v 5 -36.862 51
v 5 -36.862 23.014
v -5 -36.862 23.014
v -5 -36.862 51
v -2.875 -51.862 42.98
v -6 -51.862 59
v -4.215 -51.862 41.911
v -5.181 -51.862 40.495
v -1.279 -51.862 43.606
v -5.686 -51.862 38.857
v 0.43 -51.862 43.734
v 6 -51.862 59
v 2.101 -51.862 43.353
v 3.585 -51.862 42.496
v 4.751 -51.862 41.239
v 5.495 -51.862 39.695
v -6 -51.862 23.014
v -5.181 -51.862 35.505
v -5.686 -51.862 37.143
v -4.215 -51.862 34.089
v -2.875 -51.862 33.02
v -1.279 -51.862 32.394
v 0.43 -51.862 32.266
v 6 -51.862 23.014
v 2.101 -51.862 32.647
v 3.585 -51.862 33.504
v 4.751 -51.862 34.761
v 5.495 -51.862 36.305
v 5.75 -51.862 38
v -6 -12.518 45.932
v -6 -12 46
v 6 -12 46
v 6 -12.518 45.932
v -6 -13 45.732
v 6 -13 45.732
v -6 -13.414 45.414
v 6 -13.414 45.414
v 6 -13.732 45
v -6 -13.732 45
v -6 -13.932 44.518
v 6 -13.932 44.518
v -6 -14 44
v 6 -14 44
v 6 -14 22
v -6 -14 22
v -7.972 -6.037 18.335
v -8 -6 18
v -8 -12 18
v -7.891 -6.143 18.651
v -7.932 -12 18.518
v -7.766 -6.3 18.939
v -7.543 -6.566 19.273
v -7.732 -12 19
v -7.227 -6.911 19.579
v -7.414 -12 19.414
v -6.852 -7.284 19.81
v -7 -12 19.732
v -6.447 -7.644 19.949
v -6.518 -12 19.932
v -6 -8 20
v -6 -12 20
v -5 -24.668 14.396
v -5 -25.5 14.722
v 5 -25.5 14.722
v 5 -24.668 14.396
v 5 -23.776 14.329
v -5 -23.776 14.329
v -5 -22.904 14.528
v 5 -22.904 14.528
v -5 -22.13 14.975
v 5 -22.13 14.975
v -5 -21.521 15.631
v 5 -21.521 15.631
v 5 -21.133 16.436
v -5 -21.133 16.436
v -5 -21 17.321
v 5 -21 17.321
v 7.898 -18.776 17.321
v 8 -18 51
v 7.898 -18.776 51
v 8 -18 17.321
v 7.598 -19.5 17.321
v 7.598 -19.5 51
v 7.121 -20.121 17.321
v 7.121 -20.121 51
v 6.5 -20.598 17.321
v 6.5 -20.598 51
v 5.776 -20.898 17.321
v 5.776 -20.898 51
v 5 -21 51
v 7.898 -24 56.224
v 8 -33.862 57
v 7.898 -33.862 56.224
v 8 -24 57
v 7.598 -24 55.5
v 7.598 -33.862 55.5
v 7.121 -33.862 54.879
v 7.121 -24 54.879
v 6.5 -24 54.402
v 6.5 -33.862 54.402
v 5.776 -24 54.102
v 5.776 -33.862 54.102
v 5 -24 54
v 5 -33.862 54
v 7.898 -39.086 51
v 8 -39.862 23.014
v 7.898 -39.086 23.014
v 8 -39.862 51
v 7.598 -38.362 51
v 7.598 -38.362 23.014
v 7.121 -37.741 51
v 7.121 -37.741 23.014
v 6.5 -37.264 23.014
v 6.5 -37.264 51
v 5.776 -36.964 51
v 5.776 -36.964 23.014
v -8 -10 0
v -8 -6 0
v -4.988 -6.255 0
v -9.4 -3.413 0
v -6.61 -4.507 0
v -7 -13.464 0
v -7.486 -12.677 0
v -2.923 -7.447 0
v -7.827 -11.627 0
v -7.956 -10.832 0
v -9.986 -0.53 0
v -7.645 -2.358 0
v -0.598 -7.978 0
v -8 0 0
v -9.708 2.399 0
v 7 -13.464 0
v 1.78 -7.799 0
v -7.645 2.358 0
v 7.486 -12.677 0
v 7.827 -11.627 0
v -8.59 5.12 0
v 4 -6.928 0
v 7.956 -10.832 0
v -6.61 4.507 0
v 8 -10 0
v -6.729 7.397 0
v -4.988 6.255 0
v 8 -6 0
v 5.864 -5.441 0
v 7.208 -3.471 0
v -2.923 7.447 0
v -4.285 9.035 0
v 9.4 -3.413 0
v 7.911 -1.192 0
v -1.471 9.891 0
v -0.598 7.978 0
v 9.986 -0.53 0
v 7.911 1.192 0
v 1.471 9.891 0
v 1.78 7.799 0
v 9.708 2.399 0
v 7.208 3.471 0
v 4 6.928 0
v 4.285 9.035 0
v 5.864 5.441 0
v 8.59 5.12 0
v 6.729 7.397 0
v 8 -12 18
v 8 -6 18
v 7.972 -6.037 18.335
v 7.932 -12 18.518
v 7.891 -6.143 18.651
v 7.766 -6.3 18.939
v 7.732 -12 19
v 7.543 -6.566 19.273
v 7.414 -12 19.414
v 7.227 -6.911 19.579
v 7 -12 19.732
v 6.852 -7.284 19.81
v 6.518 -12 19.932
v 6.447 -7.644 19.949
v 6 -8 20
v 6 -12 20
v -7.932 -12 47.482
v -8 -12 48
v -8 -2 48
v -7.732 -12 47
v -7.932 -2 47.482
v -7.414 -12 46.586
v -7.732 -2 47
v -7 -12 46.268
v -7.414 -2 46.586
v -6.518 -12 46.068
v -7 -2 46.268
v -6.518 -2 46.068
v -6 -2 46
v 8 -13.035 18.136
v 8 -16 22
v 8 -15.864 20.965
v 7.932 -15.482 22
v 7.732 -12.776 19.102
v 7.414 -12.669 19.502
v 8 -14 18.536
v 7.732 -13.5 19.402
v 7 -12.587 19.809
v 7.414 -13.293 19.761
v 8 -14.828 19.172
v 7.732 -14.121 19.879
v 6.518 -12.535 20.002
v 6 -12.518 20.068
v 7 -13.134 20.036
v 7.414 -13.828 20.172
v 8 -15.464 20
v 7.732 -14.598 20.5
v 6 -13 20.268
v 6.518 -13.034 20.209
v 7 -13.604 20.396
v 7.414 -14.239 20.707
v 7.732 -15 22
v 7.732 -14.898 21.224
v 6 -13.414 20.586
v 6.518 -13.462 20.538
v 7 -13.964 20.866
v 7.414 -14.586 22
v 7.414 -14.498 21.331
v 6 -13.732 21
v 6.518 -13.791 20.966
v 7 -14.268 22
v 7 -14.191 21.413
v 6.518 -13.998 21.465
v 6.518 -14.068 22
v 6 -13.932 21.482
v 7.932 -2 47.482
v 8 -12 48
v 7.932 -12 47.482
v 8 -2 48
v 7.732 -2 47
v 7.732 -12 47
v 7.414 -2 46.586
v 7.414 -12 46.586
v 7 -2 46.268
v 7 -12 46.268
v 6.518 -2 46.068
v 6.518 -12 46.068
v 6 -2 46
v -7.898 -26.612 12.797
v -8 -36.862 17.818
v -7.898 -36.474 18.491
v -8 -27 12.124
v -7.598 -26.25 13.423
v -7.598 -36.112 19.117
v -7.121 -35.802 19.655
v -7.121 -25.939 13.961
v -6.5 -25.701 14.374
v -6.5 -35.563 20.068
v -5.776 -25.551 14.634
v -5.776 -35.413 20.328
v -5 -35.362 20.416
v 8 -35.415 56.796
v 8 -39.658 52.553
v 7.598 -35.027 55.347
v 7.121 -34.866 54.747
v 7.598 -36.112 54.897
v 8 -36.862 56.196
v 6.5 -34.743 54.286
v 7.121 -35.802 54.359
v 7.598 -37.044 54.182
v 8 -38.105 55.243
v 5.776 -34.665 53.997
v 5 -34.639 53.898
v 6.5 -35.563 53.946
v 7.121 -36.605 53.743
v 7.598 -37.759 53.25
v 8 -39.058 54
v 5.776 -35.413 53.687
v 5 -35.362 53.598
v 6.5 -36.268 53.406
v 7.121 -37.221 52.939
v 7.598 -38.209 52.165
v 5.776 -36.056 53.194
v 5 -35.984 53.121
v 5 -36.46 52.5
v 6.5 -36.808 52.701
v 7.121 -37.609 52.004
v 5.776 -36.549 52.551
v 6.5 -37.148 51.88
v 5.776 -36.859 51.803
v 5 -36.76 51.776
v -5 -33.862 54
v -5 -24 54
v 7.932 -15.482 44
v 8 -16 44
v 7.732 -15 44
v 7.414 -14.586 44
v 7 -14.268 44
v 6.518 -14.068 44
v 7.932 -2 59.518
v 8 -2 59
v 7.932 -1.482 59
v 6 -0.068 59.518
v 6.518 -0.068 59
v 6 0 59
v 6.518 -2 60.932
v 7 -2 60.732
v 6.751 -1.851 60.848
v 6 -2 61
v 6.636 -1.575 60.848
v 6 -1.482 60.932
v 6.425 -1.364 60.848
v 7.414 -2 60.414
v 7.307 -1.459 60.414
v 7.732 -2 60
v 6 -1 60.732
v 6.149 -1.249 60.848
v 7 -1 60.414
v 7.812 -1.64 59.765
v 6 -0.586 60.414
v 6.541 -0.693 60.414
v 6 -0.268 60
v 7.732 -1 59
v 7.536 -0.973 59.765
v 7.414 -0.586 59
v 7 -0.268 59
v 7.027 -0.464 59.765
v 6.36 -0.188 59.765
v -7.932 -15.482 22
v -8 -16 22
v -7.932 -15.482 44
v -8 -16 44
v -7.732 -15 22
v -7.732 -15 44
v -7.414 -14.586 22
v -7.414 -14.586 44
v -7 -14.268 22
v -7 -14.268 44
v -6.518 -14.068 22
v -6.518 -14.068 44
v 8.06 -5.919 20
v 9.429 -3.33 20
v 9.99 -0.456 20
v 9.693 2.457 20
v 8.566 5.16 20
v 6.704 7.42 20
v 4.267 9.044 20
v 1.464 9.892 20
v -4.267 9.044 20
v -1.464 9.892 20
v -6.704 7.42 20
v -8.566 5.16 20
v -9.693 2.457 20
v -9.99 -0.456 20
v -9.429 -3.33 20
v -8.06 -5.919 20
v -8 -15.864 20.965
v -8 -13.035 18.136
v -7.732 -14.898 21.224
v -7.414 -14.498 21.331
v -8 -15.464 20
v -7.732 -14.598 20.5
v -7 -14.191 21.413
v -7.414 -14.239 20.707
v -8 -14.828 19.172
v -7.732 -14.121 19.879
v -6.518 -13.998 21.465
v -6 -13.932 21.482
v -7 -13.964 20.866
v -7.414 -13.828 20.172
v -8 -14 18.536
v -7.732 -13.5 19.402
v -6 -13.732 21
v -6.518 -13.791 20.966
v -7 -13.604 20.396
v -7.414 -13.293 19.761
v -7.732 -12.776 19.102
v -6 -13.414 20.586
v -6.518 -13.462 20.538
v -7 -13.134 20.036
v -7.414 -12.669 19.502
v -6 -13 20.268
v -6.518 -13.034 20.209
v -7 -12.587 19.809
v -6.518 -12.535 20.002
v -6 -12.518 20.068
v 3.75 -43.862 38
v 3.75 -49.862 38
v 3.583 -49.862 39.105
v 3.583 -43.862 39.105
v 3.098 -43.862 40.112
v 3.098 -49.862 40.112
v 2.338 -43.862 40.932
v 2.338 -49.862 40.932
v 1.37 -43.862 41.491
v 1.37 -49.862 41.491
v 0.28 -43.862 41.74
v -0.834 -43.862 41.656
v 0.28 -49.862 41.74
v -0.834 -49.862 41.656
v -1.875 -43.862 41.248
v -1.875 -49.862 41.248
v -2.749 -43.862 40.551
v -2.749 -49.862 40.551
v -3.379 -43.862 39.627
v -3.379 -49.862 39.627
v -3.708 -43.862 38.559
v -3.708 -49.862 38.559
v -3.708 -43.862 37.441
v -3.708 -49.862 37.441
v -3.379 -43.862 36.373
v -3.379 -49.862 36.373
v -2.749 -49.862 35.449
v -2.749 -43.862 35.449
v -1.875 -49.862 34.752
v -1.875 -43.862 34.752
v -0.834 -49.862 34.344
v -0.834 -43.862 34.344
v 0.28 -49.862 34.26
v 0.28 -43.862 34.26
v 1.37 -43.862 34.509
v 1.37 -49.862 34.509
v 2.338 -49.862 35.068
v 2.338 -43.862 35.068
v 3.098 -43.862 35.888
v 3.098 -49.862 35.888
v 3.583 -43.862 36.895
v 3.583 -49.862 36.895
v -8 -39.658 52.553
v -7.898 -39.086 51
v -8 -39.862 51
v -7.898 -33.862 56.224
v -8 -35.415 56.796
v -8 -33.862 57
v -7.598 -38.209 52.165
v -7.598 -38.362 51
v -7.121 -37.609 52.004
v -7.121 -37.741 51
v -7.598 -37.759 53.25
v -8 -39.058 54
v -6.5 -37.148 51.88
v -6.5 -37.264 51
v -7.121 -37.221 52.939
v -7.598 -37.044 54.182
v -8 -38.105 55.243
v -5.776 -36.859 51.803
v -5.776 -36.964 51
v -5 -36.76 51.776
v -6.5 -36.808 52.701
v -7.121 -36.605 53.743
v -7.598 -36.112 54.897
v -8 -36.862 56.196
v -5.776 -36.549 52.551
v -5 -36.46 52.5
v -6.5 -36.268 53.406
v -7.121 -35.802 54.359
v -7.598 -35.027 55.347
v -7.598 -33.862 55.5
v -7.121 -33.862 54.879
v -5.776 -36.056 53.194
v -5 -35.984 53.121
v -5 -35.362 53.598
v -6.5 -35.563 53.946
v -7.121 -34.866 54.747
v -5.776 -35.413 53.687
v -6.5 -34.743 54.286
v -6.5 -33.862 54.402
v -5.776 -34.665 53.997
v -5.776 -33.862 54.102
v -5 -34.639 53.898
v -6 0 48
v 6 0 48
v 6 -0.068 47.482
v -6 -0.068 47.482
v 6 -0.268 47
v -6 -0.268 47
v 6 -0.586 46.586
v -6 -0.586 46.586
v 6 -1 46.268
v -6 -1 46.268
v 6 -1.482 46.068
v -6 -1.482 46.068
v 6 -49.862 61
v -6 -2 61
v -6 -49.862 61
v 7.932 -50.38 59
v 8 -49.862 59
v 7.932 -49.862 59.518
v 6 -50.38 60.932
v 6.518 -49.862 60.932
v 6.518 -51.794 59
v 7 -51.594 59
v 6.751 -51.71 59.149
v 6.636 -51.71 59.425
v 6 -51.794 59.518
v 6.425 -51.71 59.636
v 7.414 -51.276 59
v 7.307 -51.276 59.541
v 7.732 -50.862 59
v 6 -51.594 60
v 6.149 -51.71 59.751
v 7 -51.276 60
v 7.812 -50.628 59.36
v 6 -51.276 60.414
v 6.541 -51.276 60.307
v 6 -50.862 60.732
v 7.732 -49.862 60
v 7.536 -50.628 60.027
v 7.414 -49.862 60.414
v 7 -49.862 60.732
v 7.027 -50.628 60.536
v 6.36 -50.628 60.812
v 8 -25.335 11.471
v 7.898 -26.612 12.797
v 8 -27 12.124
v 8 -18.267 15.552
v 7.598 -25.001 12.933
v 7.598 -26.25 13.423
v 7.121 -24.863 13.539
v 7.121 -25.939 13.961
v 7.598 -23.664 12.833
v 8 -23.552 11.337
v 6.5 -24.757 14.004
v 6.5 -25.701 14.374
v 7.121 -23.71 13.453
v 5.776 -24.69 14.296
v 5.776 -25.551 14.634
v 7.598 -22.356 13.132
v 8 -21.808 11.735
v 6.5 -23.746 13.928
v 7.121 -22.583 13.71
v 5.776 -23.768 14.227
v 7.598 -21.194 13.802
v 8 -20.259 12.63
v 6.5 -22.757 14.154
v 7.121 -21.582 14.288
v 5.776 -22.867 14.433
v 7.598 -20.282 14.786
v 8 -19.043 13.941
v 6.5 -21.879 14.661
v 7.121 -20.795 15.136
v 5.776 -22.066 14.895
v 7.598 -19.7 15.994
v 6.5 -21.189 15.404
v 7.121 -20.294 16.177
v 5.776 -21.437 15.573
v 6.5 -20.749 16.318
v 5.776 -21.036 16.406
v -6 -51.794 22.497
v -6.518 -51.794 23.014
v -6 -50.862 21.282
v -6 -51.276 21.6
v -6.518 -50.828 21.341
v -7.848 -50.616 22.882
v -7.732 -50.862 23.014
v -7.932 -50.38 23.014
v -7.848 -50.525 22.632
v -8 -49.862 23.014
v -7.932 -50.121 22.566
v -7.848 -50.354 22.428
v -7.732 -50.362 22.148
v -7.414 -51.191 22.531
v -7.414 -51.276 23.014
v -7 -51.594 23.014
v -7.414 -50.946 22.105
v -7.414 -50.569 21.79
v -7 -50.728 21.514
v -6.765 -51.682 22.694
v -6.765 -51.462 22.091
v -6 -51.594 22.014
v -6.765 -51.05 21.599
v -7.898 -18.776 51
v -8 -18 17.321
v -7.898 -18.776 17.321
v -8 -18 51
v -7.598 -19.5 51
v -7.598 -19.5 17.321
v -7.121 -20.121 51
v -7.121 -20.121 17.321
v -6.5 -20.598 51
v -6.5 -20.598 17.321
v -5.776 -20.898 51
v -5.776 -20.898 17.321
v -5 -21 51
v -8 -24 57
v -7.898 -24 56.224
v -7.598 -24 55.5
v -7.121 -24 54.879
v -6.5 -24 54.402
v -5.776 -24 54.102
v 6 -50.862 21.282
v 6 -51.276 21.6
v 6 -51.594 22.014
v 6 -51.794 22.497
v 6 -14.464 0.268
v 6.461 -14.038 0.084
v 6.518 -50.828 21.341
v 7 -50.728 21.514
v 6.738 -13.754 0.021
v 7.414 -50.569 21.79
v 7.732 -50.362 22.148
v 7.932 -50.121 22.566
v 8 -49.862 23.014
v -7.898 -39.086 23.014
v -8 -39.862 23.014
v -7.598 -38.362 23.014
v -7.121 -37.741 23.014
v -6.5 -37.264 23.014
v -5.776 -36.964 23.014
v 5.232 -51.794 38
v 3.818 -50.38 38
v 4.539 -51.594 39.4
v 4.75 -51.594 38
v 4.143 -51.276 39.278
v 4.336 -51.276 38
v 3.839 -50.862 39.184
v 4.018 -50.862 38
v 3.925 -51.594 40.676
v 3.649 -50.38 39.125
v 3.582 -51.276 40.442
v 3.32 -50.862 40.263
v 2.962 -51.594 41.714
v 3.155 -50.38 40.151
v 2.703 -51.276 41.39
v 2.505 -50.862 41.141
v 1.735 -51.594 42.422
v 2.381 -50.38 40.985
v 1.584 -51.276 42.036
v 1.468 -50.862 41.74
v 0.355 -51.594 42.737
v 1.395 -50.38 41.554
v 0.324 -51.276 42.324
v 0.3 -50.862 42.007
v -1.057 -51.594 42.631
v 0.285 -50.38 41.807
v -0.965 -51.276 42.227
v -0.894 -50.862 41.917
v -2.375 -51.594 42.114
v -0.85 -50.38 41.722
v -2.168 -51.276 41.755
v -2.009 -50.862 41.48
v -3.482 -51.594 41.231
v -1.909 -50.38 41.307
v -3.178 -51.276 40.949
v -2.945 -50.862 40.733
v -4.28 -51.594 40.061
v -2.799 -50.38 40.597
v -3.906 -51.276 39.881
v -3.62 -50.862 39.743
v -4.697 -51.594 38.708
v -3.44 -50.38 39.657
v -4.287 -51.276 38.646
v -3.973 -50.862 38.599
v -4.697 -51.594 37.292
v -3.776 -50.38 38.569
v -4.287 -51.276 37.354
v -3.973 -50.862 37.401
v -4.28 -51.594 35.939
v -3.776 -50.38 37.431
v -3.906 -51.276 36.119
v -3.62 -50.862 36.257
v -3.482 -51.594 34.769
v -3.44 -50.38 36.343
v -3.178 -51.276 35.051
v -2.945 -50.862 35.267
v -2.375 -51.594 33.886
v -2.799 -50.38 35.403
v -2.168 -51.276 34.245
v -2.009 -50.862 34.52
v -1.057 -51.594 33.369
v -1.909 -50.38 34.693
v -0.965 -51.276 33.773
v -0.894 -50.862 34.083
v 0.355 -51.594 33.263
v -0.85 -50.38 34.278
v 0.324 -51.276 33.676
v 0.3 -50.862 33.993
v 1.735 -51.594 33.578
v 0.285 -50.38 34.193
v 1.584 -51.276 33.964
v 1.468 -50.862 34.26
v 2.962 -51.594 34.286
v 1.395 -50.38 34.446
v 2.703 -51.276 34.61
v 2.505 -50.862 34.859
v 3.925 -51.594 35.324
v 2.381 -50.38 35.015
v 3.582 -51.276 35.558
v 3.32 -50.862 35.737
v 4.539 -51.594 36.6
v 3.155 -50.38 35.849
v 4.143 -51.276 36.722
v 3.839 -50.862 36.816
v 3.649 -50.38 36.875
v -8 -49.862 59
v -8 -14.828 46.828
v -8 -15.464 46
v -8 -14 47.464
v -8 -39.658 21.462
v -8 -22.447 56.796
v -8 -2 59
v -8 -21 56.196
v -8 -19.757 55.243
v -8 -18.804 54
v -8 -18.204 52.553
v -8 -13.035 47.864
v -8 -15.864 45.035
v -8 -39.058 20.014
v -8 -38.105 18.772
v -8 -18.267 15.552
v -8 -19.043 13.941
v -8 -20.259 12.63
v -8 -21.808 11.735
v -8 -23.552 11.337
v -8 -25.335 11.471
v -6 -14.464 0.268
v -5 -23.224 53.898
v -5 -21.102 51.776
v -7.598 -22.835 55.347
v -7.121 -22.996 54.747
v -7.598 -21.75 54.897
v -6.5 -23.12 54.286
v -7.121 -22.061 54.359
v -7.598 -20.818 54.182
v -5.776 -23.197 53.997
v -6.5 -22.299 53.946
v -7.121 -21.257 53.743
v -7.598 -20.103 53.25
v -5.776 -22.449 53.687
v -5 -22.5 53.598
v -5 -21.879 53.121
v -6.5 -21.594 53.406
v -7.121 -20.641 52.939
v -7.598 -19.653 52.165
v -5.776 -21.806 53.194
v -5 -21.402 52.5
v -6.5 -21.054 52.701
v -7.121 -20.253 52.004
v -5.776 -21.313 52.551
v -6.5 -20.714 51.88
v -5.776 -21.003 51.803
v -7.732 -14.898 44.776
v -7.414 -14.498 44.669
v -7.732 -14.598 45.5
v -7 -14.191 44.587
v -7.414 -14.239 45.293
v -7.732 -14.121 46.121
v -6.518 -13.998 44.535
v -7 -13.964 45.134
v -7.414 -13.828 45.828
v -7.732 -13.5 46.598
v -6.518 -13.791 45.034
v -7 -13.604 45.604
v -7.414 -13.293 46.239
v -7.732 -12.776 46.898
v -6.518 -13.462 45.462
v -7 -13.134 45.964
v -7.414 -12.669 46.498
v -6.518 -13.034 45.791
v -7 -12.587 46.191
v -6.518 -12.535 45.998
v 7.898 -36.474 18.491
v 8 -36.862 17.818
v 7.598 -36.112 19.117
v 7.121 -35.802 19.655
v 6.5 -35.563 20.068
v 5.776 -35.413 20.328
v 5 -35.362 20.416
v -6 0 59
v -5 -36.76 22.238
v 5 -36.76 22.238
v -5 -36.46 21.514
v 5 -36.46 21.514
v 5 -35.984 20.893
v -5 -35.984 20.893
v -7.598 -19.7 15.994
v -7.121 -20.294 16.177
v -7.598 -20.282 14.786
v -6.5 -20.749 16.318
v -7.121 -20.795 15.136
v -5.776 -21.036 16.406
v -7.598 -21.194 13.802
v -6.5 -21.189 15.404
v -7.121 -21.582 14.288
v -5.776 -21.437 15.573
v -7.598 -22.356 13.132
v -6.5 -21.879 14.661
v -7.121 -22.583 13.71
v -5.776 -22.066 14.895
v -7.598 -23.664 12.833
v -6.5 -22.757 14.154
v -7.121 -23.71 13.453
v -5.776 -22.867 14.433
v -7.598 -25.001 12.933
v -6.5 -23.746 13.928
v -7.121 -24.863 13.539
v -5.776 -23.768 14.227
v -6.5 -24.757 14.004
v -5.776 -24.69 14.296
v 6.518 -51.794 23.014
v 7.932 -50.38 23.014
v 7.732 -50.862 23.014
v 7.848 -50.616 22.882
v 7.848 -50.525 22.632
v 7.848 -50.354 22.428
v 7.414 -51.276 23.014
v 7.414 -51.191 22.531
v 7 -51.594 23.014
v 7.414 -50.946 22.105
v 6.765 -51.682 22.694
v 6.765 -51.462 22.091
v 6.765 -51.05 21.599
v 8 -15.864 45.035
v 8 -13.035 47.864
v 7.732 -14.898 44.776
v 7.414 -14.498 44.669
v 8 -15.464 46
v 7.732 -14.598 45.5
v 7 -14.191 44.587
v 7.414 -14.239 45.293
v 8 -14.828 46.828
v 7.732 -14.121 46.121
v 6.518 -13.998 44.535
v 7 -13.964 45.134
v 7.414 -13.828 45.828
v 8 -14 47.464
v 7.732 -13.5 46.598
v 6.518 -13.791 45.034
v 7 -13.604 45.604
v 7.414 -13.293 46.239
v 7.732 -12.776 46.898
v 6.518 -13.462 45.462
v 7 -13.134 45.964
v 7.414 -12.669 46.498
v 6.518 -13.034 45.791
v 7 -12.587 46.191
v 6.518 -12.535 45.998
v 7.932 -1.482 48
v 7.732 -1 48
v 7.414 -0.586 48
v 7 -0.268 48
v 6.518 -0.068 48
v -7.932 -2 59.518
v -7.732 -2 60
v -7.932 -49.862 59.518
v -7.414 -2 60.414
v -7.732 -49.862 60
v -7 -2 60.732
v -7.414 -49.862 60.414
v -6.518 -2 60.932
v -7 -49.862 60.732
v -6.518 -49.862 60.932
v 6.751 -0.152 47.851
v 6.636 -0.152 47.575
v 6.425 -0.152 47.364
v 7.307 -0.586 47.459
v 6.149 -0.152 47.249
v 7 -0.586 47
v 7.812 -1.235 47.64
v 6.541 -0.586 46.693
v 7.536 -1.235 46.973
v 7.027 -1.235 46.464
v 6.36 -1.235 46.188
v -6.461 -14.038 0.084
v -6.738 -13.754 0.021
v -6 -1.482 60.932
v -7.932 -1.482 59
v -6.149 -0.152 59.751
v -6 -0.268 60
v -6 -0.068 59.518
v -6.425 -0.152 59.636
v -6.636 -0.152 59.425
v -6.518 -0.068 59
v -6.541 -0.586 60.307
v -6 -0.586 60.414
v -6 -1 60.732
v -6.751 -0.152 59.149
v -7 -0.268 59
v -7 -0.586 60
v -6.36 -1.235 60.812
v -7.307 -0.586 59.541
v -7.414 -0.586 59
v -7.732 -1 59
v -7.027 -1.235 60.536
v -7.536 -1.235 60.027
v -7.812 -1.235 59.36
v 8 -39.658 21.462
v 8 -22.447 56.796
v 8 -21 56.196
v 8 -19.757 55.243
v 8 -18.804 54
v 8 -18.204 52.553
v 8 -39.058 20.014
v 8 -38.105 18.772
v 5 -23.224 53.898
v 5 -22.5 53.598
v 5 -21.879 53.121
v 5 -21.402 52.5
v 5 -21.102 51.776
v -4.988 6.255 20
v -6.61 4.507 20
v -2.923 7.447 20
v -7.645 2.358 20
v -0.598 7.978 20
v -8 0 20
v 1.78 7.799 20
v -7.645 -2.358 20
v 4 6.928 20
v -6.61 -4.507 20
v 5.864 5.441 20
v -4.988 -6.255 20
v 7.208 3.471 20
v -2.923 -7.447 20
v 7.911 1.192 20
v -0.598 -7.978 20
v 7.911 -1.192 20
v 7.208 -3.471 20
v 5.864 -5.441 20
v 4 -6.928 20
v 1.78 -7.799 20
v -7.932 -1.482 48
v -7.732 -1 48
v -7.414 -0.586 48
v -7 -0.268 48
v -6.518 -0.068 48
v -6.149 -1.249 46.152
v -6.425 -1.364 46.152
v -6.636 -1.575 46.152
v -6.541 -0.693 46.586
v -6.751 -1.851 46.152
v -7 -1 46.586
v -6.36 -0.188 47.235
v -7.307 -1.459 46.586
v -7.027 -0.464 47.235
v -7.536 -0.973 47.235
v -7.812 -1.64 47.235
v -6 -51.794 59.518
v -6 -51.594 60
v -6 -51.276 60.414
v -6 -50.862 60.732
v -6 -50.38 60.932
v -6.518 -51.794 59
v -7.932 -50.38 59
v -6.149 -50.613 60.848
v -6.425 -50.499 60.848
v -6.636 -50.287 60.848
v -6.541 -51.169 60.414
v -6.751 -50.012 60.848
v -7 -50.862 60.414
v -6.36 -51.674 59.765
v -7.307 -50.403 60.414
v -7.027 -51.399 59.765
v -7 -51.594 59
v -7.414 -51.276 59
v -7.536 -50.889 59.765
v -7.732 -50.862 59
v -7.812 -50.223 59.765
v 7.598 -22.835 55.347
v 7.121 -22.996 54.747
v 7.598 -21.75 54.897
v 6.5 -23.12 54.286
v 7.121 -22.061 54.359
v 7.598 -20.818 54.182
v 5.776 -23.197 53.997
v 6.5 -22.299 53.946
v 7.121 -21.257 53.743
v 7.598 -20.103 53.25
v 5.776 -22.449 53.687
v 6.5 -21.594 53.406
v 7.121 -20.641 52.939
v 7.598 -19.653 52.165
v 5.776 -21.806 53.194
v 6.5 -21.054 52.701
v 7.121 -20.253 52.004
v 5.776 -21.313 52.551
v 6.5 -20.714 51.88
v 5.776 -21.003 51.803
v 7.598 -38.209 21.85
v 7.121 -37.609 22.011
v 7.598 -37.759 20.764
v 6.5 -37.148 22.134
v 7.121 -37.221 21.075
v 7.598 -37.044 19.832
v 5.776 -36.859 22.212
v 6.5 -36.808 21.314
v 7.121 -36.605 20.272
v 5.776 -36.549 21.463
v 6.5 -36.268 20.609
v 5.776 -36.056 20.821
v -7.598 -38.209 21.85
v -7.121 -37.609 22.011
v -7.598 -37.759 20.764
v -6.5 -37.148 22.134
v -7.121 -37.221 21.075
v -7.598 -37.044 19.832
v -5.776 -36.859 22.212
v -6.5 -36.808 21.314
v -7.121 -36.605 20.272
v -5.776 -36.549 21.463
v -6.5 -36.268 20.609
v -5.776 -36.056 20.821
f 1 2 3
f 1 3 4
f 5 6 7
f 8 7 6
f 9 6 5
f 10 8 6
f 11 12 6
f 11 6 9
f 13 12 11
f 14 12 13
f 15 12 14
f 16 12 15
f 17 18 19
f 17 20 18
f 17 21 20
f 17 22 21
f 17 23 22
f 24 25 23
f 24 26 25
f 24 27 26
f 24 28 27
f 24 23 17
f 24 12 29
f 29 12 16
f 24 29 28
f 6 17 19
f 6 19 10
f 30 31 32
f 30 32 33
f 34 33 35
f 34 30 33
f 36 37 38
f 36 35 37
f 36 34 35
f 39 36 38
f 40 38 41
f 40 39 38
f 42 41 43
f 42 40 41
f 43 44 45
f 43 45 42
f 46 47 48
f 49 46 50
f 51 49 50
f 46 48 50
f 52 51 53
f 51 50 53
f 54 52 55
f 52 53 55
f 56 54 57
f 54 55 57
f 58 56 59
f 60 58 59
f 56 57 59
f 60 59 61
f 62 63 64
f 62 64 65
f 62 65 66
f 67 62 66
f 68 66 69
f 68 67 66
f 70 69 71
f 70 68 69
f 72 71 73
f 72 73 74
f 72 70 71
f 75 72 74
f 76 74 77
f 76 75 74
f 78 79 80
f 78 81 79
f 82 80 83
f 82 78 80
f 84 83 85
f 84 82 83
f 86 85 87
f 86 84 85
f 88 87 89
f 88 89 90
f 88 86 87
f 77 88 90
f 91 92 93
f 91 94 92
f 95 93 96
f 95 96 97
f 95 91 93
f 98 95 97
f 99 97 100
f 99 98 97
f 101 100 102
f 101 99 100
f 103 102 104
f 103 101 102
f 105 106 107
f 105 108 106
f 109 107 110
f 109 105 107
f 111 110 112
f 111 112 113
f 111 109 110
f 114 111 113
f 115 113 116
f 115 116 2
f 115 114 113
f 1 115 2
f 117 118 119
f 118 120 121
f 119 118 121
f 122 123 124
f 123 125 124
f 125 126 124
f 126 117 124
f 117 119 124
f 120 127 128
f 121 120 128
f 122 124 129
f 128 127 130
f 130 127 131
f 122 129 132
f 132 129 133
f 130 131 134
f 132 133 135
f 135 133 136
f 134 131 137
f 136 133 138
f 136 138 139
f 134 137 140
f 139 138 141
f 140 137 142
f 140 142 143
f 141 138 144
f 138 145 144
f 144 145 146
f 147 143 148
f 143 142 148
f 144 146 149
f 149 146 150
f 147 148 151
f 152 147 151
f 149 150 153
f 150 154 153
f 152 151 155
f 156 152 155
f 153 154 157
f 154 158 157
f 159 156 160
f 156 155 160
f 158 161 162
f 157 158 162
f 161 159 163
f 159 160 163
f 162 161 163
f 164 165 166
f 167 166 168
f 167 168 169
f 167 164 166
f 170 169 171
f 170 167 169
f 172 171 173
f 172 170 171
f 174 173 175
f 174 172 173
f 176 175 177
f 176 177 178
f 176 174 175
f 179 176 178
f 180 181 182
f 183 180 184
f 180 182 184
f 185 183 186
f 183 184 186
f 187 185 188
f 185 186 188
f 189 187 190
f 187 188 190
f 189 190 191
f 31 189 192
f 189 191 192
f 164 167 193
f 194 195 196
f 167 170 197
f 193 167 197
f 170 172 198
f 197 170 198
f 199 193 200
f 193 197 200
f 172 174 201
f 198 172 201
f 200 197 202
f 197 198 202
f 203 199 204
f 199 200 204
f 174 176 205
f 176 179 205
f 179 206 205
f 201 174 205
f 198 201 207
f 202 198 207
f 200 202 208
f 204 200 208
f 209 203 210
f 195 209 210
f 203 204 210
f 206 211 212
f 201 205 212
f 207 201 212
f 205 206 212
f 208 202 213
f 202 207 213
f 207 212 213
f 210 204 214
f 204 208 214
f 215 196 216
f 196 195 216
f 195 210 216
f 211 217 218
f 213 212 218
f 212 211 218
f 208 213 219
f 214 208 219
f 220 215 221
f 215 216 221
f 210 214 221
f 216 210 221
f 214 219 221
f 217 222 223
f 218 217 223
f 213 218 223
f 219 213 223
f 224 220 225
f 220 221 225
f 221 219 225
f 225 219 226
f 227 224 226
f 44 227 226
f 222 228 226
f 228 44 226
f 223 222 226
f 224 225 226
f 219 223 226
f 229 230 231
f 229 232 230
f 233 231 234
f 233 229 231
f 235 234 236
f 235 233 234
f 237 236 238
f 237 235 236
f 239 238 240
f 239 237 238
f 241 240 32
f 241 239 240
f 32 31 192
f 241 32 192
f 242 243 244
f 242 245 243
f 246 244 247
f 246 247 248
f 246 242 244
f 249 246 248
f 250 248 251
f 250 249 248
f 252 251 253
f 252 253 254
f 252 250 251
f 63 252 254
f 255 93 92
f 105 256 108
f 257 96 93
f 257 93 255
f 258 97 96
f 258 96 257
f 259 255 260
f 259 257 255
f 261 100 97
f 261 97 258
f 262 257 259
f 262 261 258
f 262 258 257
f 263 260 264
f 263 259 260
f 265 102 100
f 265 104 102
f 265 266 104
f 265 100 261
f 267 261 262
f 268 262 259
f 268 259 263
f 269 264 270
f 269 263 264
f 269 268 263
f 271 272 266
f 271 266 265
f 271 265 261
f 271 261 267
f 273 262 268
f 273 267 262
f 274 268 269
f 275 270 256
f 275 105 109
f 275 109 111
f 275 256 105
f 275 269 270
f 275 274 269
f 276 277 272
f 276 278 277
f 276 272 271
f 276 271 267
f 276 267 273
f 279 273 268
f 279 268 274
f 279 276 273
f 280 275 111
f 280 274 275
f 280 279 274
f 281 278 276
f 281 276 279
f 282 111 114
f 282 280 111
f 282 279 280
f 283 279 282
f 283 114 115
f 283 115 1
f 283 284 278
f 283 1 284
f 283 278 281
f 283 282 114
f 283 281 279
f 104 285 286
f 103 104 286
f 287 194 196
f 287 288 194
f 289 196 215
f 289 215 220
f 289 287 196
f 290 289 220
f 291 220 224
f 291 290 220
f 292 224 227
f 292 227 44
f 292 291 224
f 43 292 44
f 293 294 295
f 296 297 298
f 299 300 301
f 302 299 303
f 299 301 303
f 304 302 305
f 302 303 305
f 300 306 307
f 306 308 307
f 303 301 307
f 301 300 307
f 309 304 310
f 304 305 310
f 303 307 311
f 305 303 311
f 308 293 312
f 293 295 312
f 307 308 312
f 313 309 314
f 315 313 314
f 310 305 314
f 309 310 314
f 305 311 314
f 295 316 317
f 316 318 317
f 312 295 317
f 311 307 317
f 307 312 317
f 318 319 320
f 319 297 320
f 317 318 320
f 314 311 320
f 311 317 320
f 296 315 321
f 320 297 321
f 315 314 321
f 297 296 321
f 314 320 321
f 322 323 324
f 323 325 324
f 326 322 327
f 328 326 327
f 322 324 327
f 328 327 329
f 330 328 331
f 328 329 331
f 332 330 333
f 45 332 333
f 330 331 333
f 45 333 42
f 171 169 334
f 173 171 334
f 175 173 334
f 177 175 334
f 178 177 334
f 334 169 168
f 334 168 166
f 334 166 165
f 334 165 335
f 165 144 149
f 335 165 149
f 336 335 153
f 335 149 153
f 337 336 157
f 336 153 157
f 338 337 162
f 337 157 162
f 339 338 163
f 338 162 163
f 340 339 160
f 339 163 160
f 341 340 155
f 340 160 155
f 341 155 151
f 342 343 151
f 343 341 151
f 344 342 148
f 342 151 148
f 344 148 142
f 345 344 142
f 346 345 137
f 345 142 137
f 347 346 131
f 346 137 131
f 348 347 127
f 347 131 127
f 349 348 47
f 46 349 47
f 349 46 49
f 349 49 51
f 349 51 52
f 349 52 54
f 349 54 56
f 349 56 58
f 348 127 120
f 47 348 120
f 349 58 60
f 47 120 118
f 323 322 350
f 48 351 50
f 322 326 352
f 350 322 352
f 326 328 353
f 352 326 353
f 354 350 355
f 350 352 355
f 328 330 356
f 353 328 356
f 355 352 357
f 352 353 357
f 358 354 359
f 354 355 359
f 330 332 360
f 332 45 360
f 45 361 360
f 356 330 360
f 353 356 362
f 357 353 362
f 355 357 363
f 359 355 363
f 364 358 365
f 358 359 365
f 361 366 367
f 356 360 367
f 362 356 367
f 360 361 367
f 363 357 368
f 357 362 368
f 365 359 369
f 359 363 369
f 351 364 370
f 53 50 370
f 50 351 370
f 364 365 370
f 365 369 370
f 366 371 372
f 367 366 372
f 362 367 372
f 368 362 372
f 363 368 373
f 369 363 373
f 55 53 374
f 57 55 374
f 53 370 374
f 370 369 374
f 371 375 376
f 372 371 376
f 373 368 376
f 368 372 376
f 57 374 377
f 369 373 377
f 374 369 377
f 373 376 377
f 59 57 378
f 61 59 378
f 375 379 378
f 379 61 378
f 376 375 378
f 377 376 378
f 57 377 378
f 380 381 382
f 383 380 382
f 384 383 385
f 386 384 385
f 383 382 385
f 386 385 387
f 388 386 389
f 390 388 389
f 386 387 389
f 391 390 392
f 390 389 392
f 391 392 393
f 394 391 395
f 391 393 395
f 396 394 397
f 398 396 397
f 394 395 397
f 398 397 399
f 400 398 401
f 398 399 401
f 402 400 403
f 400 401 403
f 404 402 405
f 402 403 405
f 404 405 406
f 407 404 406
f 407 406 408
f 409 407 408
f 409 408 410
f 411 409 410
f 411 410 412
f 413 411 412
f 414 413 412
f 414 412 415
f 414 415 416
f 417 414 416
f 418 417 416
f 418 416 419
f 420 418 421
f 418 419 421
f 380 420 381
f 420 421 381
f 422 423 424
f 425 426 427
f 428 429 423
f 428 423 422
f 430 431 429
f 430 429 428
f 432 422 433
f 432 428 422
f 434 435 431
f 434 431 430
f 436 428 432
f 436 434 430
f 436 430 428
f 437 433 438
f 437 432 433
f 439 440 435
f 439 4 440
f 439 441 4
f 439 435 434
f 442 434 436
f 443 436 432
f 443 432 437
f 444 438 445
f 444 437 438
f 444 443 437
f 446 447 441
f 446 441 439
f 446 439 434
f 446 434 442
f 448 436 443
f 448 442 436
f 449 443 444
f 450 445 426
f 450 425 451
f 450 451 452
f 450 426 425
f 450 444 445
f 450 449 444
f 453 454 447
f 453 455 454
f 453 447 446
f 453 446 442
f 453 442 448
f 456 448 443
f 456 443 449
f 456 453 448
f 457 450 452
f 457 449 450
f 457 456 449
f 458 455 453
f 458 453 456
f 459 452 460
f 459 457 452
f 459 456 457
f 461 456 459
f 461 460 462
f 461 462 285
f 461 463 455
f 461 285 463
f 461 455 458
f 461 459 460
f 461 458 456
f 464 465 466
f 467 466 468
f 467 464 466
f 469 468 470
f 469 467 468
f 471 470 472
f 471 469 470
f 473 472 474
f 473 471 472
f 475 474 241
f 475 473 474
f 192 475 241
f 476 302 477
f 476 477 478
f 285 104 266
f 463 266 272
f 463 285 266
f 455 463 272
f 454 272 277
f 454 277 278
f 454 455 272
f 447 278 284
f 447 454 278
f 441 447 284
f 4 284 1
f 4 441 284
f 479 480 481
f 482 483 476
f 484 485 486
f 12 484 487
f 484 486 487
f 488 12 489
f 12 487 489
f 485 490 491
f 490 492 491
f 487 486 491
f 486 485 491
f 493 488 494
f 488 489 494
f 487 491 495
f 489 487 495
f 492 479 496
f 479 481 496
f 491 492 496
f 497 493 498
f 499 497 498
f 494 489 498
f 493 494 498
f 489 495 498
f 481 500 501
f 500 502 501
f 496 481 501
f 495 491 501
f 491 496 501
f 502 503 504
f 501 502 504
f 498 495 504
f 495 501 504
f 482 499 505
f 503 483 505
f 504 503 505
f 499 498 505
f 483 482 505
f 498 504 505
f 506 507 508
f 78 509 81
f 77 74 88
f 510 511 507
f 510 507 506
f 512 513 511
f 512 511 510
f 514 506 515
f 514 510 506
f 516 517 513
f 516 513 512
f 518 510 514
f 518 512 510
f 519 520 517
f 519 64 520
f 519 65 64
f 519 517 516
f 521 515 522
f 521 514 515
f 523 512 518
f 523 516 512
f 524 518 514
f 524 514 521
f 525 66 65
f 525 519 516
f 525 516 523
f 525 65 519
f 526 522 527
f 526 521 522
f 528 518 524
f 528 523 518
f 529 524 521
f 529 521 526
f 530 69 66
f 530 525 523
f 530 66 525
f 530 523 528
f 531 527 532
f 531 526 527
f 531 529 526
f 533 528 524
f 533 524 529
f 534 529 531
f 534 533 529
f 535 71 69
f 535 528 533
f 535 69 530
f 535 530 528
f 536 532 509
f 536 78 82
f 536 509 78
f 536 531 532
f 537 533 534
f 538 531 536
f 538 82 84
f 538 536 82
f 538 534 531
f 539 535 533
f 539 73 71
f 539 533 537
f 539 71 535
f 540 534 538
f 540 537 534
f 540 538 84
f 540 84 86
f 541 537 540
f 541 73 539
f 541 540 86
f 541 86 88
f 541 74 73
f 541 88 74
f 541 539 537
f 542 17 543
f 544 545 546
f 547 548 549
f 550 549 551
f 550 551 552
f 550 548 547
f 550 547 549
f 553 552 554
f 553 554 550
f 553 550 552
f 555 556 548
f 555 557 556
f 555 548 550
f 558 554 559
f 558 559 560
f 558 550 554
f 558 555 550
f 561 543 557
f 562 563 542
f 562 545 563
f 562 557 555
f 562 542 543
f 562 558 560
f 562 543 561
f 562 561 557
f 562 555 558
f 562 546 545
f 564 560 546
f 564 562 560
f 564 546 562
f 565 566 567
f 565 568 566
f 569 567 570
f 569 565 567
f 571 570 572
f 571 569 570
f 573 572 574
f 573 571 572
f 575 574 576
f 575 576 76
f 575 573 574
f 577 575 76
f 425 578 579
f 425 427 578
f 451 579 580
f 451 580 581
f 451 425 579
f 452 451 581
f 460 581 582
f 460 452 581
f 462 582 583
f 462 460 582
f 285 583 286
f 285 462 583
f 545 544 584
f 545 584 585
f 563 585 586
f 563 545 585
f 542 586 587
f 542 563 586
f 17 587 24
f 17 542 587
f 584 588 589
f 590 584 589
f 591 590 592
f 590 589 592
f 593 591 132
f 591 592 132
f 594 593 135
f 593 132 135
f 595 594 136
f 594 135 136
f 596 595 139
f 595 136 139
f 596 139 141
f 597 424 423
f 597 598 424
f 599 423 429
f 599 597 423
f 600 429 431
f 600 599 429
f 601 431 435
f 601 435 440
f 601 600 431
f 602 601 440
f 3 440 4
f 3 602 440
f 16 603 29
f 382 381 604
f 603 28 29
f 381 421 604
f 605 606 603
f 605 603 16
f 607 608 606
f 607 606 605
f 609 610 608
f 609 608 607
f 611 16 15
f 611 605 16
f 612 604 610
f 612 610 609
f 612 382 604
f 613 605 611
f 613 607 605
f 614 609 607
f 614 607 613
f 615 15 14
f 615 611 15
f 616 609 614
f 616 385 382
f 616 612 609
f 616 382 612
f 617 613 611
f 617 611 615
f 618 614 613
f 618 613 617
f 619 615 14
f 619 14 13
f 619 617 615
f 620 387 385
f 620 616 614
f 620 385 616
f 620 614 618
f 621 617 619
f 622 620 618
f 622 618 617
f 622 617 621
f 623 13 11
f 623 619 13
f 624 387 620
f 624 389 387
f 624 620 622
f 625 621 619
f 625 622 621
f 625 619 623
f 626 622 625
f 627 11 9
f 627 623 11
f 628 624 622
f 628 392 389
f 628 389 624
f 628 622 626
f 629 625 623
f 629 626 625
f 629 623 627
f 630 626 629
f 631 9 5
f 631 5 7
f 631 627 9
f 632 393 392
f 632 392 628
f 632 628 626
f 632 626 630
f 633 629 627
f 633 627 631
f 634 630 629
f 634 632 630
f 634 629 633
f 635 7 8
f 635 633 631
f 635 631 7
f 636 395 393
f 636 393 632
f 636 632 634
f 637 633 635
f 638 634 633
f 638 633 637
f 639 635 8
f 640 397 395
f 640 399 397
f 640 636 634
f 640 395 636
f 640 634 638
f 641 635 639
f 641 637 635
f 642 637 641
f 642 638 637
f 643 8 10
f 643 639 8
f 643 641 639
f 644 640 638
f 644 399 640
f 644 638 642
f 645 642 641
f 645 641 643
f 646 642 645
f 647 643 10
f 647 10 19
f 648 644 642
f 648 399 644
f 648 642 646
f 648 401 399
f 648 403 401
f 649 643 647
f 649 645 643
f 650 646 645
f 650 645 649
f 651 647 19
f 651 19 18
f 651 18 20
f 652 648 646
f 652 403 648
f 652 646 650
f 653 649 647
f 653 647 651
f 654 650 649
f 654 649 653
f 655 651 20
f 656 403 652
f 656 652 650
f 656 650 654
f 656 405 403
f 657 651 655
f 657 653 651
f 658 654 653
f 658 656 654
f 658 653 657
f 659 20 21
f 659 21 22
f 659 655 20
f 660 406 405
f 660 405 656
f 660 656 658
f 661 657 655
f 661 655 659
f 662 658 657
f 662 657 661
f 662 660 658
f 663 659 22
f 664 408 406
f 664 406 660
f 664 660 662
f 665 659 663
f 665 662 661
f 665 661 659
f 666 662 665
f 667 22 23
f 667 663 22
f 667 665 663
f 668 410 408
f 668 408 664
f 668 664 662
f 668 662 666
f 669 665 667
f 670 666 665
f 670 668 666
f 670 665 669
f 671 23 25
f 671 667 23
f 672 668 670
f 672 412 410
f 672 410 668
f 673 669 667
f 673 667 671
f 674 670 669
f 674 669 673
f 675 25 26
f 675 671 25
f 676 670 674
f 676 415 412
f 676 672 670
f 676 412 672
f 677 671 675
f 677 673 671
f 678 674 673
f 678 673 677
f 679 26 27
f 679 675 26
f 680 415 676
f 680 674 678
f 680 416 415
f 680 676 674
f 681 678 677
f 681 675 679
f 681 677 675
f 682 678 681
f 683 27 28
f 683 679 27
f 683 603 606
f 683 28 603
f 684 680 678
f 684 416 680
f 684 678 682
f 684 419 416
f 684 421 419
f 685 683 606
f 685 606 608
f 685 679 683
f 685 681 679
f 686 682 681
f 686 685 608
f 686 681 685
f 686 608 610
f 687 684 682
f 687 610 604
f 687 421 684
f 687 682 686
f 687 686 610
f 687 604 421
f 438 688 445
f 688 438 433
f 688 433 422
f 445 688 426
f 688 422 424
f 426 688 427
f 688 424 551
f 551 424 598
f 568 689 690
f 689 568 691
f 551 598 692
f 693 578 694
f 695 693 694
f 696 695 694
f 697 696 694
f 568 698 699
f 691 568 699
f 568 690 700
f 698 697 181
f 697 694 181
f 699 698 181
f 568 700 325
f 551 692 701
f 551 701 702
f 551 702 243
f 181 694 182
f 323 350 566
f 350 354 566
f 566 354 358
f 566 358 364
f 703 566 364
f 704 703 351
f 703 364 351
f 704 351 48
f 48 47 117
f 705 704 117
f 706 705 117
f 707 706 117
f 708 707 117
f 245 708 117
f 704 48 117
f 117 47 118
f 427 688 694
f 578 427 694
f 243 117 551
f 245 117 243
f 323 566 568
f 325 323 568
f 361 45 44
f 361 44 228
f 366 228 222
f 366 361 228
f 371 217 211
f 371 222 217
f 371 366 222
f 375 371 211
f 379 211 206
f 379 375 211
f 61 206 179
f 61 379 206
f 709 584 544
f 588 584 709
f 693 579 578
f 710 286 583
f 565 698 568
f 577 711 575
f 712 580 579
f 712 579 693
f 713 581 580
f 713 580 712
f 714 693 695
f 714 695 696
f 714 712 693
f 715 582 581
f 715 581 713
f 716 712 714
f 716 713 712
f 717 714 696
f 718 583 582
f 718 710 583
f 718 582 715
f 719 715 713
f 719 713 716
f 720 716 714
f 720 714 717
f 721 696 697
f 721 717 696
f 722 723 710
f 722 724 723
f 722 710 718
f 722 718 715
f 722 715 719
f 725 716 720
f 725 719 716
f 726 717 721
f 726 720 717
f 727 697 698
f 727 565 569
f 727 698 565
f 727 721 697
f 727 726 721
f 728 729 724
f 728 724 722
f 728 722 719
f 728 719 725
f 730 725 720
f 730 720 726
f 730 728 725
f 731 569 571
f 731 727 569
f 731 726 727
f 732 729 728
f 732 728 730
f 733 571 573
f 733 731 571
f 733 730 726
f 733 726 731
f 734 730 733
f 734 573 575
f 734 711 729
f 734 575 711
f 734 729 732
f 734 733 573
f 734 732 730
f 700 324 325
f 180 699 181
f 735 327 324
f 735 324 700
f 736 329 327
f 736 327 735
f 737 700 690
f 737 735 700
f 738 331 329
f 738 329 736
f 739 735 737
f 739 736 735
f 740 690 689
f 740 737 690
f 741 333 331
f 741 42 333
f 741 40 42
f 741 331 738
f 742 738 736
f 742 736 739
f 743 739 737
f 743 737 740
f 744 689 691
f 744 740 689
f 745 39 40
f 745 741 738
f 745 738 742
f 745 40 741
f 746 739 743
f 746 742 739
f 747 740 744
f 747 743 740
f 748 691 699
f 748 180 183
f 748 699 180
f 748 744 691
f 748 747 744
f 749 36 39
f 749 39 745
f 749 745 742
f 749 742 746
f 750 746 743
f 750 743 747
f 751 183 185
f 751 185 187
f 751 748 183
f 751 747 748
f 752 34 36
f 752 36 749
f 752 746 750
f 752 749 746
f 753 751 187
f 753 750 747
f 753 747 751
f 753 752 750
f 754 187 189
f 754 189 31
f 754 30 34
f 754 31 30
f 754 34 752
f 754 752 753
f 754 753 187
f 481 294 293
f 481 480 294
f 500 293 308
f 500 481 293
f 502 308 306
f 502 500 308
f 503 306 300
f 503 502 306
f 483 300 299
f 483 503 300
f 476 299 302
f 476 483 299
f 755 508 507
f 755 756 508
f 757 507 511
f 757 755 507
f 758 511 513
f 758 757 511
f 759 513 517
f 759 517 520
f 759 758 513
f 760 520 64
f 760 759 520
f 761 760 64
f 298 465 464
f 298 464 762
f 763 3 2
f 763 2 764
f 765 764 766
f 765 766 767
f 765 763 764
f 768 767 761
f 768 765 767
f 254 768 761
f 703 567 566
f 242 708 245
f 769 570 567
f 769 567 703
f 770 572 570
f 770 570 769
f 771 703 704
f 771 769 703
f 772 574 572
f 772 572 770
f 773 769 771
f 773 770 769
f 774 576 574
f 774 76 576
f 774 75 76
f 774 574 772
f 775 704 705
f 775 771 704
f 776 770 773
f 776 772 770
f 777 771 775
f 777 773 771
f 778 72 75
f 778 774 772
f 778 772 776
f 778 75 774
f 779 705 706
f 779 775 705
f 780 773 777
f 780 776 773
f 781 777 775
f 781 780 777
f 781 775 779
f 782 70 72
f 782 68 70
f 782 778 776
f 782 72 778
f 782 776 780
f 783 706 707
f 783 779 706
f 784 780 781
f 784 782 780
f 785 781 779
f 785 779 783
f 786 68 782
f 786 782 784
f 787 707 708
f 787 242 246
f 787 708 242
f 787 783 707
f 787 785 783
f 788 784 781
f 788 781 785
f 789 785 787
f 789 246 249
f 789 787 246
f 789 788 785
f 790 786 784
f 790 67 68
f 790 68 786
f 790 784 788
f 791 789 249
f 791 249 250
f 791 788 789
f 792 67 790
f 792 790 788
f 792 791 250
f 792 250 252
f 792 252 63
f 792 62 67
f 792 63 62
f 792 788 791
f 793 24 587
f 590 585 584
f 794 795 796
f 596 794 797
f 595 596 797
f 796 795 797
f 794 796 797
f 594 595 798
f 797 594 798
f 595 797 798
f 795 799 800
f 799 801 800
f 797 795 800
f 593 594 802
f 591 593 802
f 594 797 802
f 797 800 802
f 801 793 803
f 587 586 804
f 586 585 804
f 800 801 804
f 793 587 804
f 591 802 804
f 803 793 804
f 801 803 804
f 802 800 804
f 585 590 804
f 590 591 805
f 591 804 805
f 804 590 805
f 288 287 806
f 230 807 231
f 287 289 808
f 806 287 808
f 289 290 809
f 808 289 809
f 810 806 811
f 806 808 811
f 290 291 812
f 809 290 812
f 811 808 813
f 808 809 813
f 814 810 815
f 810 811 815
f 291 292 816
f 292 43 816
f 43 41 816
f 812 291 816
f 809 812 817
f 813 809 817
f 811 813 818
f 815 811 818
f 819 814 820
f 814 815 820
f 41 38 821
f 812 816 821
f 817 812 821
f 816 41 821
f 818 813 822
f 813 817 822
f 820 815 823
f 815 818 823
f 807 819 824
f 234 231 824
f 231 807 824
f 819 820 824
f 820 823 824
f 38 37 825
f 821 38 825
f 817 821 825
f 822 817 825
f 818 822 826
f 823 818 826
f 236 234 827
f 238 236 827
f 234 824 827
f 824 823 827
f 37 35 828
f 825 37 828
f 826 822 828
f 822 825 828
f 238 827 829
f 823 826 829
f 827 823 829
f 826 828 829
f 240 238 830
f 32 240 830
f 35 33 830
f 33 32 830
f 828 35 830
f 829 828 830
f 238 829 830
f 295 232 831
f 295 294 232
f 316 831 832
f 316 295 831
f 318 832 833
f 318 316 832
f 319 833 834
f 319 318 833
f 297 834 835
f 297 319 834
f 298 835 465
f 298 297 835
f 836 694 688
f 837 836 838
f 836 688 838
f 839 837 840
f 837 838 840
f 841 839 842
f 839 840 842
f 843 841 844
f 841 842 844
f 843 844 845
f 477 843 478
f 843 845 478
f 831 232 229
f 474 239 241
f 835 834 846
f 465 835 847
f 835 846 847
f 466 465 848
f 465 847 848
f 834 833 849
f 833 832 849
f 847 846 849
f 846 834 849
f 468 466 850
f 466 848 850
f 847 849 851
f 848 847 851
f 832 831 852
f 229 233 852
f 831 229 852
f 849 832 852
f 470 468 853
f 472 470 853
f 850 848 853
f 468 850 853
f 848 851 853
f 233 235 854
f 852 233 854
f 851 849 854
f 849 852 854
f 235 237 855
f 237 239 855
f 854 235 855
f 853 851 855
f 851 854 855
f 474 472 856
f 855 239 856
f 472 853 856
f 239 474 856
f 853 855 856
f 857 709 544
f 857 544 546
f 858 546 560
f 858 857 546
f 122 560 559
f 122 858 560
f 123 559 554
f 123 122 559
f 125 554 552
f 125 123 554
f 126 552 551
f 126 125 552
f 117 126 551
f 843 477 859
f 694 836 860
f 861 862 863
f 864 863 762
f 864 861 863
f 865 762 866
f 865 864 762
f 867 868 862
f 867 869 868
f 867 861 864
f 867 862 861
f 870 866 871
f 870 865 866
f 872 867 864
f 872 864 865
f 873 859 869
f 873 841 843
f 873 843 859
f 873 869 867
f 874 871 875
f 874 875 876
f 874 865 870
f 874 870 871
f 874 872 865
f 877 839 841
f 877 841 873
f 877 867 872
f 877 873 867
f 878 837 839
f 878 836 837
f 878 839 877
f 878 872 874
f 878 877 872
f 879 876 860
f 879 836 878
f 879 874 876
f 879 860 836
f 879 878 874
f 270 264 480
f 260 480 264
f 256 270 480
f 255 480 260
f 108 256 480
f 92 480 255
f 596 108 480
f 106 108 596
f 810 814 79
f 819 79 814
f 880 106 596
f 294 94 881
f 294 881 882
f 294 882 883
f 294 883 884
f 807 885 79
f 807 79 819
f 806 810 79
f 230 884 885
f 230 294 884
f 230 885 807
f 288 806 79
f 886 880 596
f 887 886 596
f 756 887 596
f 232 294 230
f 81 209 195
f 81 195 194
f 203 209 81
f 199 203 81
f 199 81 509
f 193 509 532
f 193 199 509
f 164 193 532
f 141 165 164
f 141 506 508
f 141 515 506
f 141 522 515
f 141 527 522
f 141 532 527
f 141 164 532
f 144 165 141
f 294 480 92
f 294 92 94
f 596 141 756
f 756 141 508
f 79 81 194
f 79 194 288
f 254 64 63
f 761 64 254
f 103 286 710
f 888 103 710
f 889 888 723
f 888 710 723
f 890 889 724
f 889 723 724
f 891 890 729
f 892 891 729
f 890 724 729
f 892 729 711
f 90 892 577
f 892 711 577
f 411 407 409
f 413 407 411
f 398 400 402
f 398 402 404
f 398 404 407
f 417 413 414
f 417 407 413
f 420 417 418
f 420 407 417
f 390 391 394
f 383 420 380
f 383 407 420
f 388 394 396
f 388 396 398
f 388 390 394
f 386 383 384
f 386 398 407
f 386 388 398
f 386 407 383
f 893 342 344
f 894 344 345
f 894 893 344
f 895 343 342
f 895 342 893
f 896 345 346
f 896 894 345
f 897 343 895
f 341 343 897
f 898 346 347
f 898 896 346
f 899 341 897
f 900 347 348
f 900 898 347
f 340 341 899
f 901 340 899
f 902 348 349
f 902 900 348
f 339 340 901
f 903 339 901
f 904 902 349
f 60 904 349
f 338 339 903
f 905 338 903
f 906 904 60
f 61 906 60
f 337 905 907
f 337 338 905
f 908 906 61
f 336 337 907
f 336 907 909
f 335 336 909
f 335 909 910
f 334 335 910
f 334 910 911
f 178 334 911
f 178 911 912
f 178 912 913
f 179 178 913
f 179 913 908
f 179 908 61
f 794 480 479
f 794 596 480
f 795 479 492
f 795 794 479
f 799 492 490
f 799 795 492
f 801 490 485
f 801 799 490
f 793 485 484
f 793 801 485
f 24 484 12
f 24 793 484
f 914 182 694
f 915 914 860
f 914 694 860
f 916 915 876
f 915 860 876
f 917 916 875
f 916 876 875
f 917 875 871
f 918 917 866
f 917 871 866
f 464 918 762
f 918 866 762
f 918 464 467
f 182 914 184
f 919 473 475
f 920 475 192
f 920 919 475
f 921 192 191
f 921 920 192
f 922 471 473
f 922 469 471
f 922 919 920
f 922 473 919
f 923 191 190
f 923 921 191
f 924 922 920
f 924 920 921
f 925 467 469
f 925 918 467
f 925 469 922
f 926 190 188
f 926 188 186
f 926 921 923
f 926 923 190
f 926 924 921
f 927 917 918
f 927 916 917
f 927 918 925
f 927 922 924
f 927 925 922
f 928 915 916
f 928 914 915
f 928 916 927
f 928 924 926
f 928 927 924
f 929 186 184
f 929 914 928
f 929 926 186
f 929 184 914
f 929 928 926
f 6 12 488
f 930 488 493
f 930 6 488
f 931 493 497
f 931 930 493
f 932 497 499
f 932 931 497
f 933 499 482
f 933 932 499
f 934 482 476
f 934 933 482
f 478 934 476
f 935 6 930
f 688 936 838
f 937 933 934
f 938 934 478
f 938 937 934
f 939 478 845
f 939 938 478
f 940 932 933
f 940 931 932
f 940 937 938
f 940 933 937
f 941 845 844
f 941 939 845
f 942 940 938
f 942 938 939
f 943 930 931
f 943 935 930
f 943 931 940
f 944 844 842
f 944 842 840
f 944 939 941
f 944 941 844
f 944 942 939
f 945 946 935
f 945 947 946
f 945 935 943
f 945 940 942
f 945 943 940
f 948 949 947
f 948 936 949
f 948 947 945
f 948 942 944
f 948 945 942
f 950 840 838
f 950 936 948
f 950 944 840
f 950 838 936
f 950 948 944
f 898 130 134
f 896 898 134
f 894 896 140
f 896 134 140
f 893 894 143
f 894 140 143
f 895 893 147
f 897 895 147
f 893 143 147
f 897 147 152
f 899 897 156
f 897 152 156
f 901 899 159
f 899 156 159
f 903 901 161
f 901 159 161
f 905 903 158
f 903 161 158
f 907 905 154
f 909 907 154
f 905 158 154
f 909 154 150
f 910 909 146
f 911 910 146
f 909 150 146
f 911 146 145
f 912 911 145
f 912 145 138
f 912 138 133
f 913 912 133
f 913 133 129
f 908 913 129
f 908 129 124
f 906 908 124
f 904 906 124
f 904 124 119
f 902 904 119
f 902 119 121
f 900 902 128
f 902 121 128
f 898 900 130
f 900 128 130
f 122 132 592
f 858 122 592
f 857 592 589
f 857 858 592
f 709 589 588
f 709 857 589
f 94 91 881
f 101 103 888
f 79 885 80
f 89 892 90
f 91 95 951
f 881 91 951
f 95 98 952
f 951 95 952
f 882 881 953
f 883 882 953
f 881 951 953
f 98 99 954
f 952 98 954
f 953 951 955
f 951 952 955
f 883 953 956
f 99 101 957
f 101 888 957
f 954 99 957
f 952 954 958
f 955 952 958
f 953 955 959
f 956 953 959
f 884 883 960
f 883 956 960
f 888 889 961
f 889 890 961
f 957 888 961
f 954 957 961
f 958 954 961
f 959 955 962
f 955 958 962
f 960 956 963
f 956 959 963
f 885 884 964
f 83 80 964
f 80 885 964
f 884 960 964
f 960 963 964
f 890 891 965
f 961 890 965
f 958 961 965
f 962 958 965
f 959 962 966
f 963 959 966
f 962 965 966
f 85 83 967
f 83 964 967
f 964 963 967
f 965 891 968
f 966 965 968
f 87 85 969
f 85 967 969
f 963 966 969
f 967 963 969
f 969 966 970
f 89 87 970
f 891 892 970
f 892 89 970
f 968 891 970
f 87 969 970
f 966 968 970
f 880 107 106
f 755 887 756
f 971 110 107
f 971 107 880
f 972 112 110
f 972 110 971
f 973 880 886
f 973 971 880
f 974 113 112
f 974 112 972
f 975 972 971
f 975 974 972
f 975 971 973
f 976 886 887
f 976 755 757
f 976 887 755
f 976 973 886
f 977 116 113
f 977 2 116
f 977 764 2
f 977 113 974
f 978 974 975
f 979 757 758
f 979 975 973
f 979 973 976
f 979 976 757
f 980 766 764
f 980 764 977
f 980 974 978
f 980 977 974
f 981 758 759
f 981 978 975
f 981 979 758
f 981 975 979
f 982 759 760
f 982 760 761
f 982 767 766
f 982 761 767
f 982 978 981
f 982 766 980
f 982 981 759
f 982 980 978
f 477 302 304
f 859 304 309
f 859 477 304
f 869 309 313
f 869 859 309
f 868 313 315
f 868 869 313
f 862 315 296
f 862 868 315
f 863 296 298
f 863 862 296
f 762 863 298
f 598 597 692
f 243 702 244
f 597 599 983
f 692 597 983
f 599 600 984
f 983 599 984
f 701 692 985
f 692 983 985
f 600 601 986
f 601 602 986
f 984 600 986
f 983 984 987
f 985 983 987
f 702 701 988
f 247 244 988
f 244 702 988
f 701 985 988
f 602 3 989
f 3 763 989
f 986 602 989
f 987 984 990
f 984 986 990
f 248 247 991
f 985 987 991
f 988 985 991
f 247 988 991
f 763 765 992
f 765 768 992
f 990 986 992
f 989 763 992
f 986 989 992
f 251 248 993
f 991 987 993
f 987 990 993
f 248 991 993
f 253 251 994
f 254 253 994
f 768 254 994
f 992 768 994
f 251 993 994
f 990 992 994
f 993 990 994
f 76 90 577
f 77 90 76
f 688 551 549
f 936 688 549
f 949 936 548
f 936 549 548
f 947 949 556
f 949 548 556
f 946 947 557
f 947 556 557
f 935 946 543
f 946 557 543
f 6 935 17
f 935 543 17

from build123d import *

# Parameters (mm, degrees)
SCHIZZO1_R                        = 10
ESTRUSIONE_ESTRUSIONE1_DEPTH      = 20
ESTRUSIONE_ESTRUSIONE2_DEPTH      = 8
ESTRUSIONE_ESTRUSIONE2_DEPTH_BACK = 8
SCHIZZO3_R                        = 8
TAGLIO_ESTRUSIONE1_DEPTH          = 20
SCHIZZO4_R                        = 3.75
TAGLIO_ESTRUSIONE2_DEPTH          = 8
RACCORDO1_R                       = 2
TAGLIO_ESTRUSIONE4_REACH          = 20
RACCORDO4_R                       = 3


with BuildPart() as part:
    # Schizzo1 → Estrusione-Estrusione1 (new body)
    with BuildSketch(Plane.XY):
        Circle(SCHIZZO1_R)
    extrude(amount=ESTRUSIONE_ESTRUSIONE1_DEPTH)

    # Schizzo2 → Estrusione-Estrusione2 (add, two sides)
    with BuildSketch(Plane(origin=(0, 0, 0), x_dir=(0, 0, -1), z_dir=(1, 0, 0))) as estrusione_estrusione2_sk:
        Polygon((0, 0), (-20, 0), (-20, -14), (-46, -14), (-46, 0), (-61, 0), (-61, -51.86222015), (-21.859762995, -51.86222015), (0, -14), align=None)
    extrude(amount=ESTRUSIONE_ESTRUSIONE2_DEPTH)
    extrude(estrusione_estrusione2_sk.sketch, amount=-ESTRUSIONE_ESTRUSIONE2_DEPTH_BACK)

    # Schizzo3 → Taglio-Estrusione1 (cut)
    with BuildSketch(Plane(origin=(0, 0, 0), x_dir=(-1, 0, 0), z_dir=(0, 0, -1))):
        Circle(SCHIZZO3_R)
    extrude(amount=-TAGLIO_ESTRUSIONE1_DEPTH, mode=Mode.SUBTRACT)

    # Schizzo4 → Taglio-Estrusione2 (cut)
    with BuildSketch(Plane.XZ.offset(51.86222015)):
        with Locations((0, 38)):
            Circle(SCHIZZO4_R)
    extrude(amount=-TAGLIO_ESTRUSIONE2_DEPTH, mode=Mode.SUBTRACT)

    # Raccordo1
    raccordo1_edges = [part.edges().sort_by_distance(p)[0] for p in [
        (8, -10, 20),
        (8, -14, 33),
        (8, -7, 46),
        (8, 0, 53.5),
        (8, -25.931110075, 61),
        (8, -51.86222015, 41.429881498),
        (8, -32.931110075, 10.929881498),
        (0, -14, 0),
        (-8, -32.931110075, 10.929881498),
        (0, -51.86222015, 21.859762995),
        (-8, -51.86222015, 41.429881498),
        (0, -51.86222015, 61),
        (-8, -25.931110075, 61),
        (0, 0, 61),
        (-8, 0, 53.5),
        (0, 0, 46),
        (-8, -7, 46),
        (0, -14, 46),
        (-8, -14, 33),
        (-8, -10, 20),
        (0, -14, 20),
        (-3.75, -51.86222015, 38),
    ]]
    fillet(raccordo1_edges, radius=RACCORDO1_R)

    # Schizzo6 → Taglio-Estrusione4 (cut, up to next)
    with BuildSketch(Plane(origin=(8, 0, 0), x_dir=(0, 0, -1), z_dir=(1, 0, 0)), mode=Mode.PRIVATE) as taglio_estrusione4_sk1:
        Polygon((-54, -21), (-12.124355653, -21), (-21.282412726, -36.86222015), (-54, -36.86222015), align=None)
    taglio_estrusione4_tool1 = extrude(taglio_estrusione4_sk1.sketch, amount=-TAGLIO_ESTRUSIONE4_REACH, mode=Mode.PRIVATE) & part.part
    add(taglio_estrusione4_tool1.solids().sort_by_distance((8, -28.606534, 35.257995))[0], mode=Mode.SUBTRACT)

    # Raccordo4
    raccordo4_edges = [part.edges().sort_by_distance(p)[0] for p in [
        (0, -36.86222015, 54),
        (0, -21, 54),
        (0, -21, 12.124355653),
        (0, -36.86222015, 21.282412726),
        (8, -28.931110075, 54),
        (8, -36.86222015, 37.641206363),
        (8, -28.931110075, 16.70338419),
        (8, -21, 33.062177826),
        (-8, -36.86222015, 37.641206363),
        (-8, -28.931110075, 54),
        (-8, -21, 33.062177826),
        (-8, -28.931110075, 16.70338419),
    ]]
    fillet(raccordo4_edges, radius=RACCORDO4_R)


solid = part.part
